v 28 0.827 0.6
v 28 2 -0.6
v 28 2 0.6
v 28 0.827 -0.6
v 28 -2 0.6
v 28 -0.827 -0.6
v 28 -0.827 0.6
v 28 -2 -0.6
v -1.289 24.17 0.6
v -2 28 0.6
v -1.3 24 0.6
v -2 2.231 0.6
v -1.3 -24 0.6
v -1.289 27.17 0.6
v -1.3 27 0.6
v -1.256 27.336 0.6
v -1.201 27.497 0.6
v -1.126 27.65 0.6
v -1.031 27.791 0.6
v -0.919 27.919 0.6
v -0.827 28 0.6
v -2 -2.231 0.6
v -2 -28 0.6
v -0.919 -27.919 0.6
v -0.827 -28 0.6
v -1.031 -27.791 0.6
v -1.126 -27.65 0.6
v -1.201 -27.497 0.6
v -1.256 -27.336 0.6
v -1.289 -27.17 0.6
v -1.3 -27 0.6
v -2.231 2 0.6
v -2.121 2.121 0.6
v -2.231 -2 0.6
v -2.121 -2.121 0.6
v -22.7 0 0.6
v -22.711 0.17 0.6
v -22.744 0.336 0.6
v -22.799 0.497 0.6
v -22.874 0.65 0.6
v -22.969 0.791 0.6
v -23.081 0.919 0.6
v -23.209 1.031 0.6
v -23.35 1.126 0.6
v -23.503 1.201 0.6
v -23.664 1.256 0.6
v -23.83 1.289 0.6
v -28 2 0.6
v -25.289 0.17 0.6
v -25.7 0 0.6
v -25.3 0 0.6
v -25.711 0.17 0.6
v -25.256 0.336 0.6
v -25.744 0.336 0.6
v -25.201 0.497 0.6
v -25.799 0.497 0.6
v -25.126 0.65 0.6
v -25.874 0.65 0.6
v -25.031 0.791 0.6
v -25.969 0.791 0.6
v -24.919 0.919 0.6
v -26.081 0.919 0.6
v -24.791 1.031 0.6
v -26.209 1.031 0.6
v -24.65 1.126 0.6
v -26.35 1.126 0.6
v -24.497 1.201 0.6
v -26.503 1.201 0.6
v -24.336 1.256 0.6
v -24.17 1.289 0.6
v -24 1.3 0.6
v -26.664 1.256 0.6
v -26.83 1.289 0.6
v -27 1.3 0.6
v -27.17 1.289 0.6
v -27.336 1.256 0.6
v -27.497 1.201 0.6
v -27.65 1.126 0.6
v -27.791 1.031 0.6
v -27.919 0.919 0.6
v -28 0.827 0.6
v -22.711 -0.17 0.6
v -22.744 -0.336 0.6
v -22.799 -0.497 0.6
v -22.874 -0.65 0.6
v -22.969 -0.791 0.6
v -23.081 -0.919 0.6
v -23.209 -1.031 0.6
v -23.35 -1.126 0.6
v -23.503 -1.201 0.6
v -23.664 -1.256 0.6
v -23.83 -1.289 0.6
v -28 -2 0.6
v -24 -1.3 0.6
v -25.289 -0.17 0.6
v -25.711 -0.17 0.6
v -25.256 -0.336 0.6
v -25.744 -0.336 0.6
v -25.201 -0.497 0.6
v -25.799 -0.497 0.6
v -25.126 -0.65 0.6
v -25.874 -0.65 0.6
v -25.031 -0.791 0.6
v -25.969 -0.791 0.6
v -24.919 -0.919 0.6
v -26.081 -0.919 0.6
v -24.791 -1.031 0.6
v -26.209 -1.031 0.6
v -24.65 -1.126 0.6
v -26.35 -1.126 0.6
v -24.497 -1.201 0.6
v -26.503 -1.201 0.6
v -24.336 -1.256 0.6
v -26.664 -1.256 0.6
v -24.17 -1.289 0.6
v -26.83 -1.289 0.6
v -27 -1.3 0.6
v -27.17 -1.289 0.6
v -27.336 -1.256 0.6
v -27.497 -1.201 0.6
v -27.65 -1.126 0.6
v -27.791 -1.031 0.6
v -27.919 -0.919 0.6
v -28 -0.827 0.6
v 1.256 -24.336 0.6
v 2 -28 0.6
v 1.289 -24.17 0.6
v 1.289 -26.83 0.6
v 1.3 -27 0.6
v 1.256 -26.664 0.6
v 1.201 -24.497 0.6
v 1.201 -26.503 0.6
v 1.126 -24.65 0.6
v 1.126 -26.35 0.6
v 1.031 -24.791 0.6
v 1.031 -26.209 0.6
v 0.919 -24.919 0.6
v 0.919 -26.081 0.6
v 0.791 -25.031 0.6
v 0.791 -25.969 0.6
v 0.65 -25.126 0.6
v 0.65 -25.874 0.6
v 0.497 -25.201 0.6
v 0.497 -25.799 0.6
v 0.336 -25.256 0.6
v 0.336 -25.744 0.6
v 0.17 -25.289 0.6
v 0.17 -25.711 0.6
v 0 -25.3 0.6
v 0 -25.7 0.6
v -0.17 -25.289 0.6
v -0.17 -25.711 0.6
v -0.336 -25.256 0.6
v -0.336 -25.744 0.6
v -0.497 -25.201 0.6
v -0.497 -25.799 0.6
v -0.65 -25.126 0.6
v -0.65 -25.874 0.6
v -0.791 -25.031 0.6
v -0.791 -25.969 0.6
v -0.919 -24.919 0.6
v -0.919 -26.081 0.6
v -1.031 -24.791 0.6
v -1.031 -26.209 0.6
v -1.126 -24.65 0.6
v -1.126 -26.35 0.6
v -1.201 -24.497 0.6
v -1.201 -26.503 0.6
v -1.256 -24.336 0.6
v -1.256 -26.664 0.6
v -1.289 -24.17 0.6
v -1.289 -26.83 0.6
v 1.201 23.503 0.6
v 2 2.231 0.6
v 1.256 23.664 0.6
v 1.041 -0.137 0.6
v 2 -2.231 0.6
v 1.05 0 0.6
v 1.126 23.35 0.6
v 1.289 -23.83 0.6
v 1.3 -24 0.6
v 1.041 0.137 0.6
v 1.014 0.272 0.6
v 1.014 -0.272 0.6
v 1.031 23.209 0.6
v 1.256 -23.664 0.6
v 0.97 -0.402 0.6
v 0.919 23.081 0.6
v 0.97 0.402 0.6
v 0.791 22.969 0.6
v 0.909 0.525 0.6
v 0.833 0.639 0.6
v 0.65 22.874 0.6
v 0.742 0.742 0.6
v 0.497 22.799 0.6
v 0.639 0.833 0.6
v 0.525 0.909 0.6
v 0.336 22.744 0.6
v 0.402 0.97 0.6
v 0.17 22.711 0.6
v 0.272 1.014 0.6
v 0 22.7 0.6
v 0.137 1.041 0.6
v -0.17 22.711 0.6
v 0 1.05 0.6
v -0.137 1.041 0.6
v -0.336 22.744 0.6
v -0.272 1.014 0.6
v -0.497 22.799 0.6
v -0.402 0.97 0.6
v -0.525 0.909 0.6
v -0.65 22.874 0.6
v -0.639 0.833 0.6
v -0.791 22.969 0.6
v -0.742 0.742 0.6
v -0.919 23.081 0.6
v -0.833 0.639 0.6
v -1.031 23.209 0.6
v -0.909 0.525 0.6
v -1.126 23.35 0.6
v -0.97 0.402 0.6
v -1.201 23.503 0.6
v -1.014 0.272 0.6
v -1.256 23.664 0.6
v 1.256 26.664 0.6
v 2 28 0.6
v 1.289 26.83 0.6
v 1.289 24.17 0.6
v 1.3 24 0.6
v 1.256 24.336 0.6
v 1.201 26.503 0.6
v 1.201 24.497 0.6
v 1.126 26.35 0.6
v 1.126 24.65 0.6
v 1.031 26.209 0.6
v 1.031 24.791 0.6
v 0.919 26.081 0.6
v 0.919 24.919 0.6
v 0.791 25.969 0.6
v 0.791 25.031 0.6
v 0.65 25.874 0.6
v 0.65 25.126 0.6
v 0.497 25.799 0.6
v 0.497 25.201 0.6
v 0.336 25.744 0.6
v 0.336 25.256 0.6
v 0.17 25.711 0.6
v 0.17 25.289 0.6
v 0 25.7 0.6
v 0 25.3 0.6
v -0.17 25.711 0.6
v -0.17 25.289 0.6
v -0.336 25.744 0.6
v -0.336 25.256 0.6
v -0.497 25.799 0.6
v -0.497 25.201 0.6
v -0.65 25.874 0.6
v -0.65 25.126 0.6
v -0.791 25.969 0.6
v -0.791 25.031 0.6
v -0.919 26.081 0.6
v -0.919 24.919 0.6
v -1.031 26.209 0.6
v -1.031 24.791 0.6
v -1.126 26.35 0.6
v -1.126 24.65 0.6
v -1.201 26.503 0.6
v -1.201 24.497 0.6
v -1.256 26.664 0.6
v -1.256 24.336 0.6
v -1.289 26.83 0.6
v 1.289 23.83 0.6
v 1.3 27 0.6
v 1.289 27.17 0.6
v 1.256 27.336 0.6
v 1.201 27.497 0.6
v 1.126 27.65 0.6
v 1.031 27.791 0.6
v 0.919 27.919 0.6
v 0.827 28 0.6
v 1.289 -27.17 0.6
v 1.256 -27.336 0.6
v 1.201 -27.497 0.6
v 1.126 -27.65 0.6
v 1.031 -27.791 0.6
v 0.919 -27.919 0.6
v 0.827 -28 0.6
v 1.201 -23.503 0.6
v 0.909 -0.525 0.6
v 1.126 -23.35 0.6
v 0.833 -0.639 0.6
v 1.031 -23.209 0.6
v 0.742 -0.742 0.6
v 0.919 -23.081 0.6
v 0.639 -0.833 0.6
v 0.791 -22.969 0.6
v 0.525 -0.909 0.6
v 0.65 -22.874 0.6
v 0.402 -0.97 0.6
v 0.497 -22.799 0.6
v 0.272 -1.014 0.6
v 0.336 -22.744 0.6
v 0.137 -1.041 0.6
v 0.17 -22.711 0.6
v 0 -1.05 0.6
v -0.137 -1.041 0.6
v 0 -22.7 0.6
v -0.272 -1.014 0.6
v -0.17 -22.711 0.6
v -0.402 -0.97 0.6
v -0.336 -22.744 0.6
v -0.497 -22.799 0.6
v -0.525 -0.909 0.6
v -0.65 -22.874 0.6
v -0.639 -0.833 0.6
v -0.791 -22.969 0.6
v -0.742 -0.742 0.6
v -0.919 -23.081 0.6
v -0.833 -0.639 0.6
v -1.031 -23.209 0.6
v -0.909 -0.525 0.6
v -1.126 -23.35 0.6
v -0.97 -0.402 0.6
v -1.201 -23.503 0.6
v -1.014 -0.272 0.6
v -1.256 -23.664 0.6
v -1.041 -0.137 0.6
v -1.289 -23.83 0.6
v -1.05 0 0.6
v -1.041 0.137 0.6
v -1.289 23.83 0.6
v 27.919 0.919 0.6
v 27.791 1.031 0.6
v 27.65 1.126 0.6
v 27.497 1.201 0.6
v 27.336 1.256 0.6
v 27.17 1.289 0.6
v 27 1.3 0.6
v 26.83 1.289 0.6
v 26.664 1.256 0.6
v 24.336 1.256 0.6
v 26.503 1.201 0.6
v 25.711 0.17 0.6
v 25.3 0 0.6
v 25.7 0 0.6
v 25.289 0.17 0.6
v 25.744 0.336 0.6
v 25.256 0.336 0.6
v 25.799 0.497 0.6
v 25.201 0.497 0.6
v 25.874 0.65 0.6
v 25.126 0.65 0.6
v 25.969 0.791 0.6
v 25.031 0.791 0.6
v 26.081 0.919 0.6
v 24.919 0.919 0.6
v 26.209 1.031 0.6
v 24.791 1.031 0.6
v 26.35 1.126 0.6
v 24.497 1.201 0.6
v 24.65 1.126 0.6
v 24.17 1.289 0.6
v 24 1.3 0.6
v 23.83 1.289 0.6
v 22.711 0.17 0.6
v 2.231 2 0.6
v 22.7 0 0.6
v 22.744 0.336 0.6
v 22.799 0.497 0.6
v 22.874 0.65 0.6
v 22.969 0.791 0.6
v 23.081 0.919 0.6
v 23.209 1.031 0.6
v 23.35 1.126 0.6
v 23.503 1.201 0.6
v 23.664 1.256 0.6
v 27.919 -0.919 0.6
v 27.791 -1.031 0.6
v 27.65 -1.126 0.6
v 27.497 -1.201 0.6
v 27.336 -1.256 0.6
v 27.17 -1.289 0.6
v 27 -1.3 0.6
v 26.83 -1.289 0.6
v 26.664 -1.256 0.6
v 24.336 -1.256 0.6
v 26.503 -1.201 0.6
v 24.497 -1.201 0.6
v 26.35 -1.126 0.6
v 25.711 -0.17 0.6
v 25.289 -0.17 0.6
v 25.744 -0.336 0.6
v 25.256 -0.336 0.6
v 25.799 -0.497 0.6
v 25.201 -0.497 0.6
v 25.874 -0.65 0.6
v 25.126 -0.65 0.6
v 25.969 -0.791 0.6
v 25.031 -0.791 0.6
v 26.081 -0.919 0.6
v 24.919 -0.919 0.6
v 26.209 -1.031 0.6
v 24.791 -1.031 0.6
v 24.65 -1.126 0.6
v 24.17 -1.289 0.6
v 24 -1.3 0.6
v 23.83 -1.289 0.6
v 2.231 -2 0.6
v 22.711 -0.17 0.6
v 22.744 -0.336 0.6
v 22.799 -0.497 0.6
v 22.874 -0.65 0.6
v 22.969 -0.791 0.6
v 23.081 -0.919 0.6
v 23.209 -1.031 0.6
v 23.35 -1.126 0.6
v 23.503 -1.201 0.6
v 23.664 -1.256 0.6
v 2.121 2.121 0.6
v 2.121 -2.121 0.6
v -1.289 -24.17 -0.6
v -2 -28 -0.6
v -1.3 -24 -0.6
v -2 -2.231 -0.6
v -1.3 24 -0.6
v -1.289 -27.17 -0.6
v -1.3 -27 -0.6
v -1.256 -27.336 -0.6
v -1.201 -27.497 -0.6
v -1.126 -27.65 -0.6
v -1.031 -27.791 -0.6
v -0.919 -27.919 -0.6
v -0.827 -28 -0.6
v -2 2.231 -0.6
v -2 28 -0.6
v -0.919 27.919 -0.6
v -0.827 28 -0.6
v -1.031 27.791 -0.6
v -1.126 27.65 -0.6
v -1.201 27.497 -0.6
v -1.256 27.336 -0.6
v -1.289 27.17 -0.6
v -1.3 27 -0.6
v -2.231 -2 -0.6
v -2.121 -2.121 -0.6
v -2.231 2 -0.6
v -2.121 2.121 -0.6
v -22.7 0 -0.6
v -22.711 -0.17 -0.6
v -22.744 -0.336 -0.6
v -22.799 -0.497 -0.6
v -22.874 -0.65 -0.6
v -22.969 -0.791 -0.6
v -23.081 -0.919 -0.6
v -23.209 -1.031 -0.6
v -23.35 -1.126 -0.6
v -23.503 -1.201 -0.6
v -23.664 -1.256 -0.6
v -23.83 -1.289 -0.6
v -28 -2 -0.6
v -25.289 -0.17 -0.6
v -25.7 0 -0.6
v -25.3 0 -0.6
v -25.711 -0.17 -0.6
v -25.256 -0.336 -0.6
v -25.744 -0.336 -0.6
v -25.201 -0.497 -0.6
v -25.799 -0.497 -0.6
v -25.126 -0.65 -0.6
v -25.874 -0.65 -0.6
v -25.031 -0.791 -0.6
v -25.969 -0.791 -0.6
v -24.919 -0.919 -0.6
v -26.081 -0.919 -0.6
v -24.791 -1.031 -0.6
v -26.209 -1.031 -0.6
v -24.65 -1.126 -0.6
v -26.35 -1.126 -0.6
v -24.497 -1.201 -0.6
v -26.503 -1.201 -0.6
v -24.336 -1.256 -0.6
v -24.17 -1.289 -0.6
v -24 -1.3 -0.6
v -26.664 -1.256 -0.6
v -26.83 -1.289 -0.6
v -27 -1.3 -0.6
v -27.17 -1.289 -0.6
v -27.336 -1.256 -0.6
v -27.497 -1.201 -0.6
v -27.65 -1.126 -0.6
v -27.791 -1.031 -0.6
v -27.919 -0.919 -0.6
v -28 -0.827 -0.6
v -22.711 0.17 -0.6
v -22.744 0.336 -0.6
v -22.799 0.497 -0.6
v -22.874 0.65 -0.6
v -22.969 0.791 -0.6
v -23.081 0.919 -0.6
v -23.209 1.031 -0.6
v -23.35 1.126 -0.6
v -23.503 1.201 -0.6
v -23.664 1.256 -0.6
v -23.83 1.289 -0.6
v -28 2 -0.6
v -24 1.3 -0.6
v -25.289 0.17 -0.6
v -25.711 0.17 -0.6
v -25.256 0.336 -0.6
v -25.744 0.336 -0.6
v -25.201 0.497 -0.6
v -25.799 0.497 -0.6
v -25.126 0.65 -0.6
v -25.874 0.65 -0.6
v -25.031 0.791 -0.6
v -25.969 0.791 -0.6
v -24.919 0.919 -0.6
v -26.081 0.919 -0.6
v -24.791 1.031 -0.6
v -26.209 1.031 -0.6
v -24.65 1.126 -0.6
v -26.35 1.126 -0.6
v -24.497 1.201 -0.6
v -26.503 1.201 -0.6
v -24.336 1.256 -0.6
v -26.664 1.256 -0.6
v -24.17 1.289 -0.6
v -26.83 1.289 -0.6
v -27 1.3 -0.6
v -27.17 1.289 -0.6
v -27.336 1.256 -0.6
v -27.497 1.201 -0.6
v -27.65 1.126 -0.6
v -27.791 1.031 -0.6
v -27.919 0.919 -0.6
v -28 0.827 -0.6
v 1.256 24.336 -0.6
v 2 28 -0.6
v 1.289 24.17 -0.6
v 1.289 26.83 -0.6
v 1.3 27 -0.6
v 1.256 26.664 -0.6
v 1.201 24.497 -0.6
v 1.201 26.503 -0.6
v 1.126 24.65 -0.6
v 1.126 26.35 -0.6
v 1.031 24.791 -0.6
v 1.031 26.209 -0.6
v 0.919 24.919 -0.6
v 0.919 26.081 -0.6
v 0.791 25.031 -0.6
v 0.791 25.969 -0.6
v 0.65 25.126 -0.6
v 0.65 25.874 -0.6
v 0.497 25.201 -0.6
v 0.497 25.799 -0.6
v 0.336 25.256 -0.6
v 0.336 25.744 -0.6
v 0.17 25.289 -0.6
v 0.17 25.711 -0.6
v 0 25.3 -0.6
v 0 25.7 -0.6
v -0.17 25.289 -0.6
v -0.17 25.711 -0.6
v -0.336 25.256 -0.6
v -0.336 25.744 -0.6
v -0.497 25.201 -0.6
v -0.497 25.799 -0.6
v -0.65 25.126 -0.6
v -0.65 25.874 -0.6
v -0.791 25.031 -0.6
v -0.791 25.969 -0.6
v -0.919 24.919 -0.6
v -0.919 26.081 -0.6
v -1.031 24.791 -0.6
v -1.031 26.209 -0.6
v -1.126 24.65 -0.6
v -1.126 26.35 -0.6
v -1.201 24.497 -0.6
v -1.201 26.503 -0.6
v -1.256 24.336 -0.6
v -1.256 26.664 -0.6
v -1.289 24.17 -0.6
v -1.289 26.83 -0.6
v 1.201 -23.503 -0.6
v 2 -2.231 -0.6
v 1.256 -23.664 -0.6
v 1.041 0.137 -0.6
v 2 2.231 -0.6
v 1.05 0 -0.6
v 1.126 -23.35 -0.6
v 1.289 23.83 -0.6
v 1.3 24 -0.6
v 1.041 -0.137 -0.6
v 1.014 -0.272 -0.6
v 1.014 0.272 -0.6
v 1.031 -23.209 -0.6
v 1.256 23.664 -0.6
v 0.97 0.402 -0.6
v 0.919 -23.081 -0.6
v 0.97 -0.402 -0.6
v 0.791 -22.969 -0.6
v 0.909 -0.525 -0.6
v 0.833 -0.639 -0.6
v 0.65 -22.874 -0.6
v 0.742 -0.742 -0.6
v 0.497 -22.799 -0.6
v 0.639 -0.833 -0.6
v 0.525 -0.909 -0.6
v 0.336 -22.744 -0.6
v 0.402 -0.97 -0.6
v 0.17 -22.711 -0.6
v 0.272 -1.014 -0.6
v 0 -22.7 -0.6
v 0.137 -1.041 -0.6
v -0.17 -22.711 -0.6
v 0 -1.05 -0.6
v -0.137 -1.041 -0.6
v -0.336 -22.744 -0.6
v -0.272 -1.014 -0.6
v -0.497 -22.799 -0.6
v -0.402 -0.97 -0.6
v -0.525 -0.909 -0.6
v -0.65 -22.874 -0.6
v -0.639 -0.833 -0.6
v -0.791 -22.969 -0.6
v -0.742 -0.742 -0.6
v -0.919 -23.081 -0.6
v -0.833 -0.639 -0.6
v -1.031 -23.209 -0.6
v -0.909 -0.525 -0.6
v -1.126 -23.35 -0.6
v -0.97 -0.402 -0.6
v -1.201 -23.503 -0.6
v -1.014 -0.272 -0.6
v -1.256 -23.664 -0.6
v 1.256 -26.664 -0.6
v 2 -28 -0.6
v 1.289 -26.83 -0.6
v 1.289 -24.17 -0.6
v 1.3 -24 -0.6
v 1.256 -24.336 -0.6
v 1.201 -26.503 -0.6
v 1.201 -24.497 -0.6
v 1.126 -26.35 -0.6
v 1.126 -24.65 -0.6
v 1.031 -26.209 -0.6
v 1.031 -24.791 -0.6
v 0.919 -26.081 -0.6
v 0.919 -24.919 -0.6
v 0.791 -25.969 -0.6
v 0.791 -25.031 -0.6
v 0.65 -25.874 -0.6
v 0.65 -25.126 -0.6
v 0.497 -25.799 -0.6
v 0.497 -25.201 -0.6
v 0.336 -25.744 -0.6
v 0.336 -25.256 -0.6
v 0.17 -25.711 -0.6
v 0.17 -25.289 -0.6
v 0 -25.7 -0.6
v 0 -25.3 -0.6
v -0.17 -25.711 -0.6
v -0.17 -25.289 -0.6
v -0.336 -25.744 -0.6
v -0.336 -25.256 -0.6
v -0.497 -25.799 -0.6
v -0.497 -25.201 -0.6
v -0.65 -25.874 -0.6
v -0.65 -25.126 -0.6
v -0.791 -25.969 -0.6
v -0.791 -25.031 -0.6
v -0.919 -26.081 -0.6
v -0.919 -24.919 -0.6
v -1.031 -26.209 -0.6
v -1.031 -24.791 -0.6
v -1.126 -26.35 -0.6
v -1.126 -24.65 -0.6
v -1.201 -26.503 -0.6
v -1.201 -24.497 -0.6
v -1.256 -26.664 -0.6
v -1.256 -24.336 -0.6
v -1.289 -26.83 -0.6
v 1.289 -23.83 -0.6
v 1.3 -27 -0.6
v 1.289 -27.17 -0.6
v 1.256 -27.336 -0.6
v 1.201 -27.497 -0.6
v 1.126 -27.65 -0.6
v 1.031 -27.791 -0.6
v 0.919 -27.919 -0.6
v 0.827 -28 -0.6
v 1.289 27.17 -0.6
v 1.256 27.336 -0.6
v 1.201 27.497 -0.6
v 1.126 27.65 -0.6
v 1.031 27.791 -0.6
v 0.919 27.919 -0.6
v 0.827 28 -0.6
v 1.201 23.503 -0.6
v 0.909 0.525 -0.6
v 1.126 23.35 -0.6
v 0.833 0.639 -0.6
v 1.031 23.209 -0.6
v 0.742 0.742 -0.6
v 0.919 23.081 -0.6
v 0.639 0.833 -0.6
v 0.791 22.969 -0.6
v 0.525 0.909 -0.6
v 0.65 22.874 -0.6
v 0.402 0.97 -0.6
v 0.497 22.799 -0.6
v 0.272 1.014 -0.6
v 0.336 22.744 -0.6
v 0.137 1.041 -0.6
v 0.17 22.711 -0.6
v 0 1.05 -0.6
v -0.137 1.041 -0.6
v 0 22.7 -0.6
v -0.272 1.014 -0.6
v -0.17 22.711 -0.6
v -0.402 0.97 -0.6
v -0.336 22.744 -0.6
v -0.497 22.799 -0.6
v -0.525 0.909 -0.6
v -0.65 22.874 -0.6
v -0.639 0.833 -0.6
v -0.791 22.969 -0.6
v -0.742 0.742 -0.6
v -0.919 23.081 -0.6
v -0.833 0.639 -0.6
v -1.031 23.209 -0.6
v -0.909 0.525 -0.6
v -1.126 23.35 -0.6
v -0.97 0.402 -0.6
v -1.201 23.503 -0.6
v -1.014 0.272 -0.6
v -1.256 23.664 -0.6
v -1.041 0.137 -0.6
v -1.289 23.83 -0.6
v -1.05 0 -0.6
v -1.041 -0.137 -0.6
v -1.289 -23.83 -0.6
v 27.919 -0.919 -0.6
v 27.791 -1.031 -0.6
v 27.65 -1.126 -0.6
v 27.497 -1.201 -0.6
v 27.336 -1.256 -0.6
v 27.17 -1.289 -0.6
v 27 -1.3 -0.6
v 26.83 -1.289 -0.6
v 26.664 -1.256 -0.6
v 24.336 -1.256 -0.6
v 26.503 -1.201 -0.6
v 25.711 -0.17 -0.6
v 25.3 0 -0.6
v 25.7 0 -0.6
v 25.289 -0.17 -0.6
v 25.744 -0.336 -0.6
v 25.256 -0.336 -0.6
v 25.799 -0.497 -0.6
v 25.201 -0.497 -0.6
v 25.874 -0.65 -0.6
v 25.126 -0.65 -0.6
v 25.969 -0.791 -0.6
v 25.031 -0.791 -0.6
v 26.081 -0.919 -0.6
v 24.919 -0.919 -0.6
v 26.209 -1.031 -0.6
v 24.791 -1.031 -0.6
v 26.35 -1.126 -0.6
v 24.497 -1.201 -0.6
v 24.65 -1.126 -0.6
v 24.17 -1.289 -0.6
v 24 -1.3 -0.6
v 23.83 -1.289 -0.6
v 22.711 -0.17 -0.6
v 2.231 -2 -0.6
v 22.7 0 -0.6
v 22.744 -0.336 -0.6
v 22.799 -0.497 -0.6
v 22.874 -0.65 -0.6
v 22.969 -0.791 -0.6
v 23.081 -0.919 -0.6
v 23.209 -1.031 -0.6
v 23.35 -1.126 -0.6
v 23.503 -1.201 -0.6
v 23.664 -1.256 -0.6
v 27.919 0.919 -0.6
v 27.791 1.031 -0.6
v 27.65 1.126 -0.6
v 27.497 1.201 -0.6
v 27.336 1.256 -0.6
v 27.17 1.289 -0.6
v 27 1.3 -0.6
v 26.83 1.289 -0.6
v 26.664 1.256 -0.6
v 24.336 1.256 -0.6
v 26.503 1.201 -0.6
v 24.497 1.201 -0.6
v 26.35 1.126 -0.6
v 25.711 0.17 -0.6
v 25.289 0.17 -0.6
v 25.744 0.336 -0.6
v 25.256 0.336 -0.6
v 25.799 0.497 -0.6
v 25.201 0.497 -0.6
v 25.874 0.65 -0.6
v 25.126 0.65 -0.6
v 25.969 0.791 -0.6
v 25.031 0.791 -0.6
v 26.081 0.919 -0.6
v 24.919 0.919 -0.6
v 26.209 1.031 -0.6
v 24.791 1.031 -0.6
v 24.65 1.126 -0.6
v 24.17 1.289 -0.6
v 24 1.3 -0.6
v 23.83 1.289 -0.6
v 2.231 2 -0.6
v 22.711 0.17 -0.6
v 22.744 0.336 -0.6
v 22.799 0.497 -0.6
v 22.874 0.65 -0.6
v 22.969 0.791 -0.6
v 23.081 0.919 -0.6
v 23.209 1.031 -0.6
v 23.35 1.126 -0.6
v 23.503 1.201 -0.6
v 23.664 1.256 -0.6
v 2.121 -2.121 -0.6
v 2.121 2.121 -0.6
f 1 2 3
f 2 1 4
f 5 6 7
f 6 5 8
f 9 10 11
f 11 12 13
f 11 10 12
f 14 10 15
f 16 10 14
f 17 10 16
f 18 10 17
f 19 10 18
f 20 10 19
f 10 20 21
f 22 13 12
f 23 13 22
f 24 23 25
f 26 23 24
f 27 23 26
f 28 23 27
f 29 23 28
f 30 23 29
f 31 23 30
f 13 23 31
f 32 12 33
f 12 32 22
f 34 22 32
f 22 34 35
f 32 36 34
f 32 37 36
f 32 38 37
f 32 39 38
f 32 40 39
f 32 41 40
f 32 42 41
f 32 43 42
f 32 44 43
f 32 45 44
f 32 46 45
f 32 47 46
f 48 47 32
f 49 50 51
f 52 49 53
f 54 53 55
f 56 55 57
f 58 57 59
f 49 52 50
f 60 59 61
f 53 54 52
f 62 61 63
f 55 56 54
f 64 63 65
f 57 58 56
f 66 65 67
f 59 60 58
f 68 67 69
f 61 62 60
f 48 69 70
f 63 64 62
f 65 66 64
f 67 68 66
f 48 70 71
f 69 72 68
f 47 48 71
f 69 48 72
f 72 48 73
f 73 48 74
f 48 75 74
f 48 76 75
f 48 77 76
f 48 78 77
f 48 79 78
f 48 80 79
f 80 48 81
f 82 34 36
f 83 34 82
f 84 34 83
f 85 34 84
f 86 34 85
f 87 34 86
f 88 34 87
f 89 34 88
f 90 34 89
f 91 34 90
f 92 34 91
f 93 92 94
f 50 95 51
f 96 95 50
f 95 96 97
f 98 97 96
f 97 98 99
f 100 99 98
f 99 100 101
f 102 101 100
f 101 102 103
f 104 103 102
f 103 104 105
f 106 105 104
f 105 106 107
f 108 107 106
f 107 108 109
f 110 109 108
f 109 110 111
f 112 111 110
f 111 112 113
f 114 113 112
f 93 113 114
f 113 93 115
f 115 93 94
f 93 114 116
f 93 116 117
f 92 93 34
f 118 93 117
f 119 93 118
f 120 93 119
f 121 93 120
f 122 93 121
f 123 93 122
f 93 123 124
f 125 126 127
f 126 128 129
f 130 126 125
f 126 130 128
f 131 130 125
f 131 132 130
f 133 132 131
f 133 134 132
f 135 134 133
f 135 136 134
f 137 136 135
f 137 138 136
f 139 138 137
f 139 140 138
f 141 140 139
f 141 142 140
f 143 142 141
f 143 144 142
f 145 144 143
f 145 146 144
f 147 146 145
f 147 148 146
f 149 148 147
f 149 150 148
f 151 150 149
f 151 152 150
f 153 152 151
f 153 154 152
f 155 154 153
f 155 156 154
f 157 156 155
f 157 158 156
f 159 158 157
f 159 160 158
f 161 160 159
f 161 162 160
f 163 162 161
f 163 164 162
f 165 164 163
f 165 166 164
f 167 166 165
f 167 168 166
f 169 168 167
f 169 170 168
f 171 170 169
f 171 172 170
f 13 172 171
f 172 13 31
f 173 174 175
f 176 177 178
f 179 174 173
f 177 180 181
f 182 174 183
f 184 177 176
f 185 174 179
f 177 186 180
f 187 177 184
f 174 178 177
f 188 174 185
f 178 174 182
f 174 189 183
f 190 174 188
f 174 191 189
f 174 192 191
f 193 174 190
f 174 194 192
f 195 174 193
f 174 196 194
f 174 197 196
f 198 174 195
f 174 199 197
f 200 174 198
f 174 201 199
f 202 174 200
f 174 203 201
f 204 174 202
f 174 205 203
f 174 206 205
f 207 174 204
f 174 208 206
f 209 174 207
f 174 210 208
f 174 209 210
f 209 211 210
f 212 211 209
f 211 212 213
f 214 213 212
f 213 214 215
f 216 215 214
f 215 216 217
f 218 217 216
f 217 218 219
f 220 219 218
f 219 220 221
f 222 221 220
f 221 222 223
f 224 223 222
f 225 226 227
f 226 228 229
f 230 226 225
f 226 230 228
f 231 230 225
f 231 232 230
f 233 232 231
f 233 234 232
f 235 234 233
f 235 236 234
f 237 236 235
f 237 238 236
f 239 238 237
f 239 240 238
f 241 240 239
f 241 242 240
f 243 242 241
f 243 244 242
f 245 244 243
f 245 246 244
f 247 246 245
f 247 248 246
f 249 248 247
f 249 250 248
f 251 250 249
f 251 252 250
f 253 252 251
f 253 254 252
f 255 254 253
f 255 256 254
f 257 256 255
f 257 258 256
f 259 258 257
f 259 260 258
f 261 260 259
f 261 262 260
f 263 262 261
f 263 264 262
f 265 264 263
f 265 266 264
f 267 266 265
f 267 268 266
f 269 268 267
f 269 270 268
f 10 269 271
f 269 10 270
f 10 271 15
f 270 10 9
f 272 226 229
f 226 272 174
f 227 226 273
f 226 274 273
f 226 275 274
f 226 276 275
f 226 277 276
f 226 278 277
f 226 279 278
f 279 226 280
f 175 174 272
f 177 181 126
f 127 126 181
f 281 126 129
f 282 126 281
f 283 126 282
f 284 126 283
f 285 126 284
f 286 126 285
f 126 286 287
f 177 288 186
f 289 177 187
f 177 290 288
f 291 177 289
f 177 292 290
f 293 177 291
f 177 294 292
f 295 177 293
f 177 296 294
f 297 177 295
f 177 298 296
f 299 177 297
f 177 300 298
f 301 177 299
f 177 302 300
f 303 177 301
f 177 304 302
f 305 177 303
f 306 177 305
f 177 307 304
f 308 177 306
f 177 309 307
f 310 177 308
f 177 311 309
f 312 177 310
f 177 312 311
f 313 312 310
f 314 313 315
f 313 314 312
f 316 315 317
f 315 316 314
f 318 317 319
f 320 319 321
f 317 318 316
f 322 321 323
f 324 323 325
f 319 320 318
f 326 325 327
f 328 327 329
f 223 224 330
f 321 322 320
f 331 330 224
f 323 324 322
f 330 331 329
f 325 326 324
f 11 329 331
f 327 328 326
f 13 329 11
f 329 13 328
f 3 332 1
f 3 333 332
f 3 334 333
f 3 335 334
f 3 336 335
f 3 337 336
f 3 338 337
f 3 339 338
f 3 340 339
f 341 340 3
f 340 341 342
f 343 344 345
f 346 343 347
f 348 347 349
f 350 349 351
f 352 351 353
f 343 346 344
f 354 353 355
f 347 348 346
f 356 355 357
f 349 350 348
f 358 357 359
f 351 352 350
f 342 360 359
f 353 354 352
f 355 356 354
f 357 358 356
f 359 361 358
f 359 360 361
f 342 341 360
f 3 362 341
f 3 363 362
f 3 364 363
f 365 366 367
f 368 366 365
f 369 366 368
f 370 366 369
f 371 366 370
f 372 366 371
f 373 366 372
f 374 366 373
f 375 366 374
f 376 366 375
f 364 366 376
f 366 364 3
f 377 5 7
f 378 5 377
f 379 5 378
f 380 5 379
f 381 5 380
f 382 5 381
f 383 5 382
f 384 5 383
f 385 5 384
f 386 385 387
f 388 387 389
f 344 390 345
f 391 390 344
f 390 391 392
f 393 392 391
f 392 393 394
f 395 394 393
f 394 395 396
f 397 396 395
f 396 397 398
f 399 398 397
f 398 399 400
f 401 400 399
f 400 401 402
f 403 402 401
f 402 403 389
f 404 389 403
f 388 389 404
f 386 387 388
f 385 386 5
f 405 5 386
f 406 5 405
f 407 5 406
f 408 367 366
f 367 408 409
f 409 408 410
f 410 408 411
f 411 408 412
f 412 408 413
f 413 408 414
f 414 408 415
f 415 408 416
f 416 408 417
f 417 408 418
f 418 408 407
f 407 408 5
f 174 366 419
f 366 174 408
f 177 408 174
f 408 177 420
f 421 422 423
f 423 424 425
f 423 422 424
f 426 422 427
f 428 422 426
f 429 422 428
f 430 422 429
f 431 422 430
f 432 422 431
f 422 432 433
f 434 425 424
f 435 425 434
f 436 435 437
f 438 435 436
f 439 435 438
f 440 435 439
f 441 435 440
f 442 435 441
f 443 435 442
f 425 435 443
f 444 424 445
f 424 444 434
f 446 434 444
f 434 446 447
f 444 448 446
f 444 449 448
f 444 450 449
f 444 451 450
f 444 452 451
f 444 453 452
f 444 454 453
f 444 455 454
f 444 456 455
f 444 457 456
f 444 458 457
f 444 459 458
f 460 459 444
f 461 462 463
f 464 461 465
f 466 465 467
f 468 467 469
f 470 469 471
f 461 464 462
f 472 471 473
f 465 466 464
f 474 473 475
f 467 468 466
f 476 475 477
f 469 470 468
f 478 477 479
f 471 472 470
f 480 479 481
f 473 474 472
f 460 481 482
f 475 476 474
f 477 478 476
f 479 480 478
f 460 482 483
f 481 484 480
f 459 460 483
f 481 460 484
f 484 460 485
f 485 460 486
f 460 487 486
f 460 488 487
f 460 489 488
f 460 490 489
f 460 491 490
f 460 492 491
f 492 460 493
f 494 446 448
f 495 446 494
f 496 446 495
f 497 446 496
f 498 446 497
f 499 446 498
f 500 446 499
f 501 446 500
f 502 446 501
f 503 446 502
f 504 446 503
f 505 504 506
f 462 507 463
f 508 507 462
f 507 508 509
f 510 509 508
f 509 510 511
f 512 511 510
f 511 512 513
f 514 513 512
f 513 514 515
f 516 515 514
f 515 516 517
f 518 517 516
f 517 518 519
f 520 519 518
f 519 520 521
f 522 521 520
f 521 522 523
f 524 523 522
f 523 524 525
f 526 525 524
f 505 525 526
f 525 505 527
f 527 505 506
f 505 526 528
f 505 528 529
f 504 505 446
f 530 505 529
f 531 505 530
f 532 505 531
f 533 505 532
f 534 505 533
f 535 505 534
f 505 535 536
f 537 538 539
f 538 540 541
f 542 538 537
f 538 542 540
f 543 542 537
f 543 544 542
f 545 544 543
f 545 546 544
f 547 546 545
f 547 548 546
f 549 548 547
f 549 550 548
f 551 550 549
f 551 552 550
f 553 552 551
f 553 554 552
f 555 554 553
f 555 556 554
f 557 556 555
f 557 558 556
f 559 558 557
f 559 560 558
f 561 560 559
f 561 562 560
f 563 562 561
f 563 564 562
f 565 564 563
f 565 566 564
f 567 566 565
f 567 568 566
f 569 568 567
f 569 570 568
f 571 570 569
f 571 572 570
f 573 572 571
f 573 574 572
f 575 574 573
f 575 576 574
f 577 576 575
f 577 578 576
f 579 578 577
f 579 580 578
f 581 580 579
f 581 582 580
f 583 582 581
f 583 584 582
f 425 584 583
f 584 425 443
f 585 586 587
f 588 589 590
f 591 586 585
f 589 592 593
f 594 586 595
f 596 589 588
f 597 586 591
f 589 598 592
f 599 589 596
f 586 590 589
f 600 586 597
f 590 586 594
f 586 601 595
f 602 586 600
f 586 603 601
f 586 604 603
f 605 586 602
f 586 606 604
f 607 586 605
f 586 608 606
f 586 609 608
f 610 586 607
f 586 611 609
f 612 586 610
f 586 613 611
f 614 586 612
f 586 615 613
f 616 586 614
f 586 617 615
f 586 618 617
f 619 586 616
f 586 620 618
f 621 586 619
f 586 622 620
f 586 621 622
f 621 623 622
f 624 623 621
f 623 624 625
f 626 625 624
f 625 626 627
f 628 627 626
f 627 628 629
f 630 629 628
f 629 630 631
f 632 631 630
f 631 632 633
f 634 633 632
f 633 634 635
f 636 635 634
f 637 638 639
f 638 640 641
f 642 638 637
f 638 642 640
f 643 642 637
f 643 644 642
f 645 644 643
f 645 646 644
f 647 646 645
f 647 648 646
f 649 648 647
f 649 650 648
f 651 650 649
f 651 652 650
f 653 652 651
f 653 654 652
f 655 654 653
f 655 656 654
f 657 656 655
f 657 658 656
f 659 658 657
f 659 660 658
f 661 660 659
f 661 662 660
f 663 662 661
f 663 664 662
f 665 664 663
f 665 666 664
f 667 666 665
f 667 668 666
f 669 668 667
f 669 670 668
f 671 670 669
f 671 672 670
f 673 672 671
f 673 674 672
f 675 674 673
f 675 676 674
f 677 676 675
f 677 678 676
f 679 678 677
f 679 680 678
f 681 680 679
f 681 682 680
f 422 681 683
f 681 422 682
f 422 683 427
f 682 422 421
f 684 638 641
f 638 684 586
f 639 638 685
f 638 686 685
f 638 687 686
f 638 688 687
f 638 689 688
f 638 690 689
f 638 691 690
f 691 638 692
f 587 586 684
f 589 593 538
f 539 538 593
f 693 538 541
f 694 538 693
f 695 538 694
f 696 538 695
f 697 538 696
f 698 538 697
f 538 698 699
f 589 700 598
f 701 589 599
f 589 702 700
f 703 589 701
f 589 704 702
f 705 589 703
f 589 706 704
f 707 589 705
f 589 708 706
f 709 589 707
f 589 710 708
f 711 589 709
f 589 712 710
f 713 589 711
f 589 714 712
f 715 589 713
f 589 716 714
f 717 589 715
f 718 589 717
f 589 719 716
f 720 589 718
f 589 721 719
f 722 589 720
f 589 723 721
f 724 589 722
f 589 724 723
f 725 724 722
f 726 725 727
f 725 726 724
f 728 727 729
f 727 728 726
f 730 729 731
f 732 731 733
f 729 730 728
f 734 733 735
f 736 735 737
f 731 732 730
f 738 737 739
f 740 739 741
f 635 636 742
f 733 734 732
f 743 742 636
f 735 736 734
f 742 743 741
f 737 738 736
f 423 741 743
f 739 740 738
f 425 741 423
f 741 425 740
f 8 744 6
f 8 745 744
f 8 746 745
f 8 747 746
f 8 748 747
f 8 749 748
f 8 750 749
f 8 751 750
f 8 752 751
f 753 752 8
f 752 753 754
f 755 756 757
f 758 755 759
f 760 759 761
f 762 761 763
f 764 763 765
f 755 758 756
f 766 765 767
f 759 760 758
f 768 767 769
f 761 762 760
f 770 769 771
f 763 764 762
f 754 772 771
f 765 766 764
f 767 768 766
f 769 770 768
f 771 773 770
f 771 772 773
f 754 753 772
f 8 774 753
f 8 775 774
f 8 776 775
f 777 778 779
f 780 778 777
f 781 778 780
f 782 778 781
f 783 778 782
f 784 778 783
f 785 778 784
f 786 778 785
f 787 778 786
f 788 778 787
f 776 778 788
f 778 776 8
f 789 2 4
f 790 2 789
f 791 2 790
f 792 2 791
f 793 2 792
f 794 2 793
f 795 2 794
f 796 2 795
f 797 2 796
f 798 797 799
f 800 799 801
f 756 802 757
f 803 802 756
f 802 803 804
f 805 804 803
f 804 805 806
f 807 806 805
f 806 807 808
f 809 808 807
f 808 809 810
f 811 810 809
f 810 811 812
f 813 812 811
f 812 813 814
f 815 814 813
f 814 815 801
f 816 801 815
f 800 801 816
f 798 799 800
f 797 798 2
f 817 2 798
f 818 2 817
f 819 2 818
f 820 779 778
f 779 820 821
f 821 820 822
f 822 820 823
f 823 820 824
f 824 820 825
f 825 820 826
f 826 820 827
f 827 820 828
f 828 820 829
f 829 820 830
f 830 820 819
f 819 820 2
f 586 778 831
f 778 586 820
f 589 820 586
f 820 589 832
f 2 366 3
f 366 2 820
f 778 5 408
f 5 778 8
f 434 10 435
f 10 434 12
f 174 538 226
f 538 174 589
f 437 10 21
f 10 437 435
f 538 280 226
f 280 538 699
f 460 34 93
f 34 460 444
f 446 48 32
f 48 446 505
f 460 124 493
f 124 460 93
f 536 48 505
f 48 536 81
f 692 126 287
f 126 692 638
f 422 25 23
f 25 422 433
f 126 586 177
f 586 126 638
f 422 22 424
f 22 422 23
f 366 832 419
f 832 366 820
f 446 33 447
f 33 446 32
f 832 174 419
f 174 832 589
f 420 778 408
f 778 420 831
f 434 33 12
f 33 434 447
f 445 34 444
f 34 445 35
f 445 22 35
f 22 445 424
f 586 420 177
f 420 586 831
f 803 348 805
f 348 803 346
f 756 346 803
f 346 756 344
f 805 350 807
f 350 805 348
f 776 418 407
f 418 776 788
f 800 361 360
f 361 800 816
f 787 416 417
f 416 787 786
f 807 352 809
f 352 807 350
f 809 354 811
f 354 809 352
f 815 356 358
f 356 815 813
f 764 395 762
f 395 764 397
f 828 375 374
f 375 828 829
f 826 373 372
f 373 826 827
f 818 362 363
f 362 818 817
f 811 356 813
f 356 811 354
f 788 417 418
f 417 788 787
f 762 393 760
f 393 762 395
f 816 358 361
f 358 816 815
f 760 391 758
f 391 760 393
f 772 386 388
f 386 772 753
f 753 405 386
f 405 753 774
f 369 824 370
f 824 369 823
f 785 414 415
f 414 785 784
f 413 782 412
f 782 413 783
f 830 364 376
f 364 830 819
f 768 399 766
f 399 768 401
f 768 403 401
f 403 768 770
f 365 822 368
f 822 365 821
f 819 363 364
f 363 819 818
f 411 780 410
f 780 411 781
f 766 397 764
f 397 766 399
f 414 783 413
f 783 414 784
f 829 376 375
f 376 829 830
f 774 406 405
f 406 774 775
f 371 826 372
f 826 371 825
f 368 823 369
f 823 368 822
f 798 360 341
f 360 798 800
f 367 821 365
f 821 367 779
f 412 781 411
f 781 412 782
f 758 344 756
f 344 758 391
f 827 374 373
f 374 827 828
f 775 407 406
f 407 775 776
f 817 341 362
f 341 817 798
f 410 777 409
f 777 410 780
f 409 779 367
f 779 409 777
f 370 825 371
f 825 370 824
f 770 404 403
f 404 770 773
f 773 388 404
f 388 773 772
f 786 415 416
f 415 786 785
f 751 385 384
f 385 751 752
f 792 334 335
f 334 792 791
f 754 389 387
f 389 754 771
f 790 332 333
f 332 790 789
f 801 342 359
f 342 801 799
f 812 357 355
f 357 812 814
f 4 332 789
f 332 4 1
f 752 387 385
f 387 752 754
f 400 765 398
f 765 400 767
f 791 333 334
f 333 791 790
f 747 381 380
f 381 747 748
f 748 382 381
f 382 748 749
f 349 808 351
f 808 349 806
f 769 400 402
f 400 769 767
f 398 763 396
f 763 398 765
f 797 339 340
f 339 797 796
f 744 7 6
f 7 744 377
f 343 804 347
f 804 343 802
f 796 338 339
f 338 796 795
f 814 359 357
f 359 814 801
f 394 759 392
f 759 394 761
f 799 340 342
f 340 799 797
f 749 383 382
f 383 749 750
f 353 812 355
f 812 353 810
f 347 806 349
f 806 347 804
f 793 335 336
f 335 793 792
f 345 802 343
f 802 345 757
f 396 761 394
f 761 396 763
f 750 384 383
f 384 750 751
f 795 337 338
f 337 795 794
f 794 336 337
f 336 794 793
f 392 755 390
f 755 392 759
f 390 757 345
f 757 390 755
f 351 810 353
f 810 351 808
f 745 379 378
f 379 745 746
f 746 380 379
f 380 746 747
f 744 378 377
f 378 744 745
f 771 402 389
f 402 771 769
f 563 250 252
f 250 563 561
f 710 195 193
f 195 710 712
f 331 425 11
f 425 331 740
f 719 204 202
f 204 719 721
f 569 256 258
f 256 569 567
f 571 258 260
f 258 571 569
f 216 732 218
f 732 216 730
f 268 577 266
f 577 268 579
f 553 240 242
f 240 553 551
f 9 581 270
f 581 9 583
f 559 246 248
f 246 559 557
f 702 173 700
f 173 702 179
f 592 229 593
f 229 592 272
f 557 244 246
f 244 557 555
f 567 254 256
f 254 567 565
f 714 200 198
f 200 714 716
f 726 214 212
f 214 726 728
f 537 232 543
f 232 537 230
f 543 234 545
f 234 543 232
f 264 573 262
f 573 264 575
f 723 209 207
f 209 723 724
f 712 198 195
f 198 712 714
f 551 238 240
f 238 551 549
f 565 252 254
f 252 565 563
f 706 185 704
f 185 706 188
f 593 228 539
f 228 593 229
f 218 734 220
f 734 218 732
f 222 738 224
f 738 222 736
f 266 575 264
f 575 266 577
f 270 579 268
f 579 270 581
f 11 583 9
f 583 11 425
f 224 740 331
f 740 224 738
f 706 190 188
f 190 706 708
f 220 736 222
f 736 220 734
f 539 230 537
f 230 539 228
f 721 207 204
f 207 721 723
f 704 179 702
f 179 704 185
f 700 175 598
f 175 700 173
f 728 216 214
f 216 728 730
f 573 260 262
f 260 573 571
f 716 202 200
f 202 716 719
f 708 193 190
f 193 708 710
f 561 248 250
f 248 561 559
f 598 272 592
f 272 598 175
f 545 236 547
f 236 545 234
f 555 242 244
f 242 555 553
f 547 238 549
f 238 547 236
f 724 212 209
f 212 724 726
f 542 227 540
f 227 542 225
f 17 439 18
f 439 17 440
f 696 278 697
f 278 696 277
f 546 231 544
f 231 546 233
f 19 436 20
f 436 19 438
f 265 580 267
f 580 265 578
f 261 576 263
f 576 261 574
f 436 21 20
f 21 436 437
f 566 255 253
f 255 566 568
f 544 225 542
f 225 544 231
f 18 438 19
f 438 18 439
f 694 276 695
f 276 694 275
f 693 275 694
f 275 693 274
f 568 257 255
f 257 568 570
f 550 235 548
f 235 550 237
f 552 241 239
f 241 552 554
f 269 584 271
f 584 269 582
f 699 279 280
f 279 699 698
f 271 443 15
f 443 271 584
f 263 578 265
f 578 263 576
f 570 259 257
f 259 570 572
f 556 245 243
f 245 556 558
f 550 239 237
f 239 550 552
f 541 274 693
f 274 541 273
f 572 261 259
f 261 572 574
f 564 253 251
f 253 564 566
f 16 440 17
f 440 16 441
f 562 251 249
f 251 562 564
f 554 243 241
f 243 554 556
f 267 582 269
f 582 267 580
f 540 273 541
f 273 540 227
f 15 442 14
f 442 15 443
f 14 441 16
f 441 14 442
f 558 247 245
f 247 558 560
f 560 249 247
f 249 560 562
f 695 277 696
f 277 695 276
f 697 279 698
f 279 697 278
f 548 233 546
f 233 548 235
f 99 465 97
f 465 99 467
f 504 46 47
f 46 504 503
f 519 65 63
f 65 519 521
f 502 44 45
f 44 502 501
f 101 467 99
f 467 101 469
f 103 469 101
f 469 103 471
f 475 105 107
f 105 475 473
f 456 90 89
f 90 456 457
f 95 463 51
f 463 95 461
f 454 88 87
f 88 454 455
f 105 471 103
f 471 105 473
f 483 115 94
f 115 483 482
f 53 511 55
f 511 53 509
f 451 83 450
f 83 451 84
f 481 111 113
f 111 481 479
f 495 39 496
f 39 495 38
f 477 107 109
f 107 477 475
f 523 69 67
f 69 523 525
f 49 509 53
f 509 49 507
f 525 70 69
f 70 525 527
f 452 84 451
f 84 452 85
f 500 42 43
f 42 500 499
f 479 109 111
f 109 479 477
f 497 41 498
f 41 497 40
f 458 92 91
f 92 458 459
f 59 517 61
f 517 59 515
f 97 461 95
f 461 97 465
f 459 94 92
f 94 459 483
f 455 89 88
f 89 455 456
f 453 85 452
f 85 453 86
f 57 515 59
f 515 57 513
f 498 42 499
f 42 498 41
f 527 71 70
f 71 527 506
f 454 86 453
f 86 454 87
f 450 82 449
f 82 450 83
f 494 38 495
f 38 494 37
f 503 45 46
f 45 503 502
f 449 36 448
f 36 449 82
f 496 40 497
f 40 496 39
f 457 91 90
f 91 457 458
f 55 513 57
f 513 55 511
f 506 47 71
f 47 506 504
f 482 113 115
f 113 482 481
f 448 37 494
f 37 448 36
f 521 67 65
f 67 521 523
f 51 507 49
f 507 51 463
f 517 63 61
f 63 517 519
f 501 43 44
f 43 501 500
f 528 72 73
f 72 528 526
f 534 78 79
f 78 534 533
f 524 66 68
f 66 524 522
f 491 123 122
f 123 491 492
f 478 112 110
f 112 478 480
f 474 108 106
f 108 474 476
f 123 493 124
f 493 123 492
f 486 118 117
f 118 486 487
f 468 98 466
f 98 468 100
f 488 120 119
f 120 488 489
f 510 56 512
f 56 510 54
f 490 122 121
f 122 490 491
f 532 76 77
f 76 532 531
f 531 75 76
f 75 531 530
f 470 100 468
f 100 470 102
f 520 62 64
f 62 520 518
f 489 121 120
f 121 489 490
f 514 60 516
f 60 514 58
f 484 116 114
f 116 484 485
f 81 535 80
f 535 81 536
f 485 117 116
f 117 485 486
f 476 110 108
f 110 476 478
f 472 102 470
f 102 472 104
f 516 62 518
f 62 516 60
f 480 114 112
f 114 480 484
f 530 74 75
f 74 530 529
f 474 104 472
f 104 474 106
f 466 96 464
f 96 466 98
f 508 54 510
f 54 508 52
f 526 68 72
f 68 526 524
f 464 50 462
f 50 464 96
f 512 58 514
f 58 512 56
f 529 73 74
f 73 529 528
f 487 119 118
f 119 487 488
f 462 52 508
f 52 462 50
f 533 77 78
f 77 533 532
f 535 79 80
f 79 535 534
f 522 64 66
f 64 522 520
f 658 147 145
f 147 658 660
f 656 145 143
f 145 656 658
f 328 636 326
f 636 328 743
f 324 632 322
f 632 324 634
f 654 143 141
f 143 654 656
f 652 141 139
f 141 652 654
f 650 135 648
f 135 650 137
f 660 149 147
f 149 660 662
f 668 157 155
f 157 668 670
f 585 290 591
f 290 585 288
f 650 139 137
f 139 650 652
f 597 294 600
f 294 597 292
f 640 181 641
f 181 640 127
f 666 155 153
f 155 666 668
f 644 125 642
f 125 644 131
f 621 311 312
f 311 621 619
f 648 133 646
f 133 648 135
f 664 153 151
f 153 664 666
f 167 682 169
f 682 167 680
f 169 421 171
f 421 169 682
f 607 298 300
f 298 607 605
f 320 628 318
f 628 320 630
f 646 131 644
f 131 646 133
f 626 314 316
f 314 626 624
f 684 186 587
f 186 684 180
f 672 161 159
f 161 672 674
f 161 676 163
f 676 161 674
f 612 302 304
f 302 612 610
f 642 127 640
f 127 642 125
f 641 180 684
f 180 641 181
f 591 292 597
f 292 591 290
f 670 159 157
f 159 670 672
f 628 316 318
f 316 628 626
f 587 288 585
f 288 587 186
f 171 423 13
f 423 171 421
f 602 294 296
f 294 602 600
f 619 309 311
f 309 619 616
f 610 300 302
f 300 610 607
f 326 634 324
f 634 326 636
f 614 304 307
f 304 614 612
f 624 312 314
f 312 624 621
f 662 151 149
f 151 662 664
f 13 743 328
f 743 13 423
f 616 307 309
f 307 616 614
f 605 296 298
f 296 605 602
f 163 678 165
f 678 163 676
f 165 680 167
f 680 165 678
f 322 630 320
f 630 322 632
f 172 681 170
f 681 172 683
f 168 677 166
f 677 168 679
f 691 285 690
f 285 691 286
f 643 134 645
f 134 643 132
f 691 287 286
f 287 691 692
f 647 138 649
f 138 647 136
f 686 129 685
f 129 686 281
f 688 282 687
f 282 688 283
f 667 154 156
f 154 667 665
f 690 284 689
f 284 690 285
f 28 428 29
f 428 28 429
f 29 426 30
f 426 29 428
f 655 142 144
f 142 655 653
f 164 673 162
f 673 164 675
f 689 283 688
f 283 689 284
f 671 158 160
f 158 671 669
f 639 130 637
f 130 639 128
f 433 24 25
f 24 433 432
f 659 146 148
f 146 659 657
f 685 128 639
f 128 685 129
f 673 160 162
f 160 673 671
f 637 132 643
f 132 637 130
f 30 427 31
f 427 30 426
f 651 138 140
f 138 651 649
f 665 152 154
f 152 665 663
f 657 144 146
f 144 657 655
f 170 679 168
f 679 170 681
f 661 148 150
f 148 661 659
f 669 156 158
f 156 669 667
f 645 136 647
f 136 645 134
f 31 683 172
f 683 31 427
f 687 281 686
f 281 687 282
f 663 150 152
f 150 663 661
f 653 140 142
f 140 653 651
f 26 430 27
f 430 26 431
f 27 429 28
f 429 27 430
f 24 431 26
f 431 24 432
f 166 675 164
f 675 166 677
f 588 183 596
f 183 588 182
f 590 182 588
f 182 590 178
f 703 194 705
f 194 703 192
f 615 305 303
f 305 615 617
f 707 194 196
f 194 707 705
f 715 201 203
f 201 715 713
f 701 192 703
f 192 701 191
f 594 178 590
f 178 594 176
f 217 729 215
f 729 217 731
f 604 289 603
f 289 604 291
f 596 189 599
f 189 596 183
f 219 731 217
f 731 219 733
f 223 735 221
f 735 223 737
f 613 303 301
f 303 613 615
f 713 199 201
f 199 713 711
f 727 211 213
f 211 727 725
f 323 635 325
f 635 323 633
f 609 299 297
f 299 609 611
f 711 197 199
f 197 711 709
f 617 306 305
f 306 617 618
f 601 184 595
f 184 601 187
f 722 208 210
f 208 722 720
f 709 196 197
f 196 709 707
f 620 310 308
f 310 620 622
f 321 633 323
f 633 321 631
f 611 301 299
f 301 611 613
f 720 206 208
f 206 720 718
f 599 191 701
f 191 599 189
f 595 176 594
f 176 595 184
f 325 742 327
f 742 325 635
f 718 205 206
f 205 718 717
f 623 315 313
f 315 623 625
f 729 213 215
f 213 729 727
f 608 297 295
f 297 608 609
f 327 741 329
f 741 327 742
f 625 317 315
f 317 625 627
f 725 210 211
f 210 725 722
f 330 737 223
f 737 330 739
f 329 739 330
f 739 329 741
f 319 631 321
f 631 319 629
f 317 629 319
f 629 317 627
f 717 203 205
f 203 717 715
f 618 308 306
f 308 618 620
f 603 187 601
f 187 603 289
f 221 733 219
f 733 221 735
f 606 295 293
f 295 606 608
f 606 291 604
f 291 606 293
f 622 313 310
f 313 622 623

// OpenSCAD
// Experimental M5/M6 internal rope-guide spider.
// Not a released/print-approved part: guide-to-body clearance and friction remain
// to be checked against deformed module geometry and a physical sample.
//
// Export one guide: set guide_kind to "M5" or "M6", press F6, then export STL.
// M5 routes B/C (r=24/27 mm); M6 routes C (r=27 mm).
// The guide is a thin cross spider supported on the central Ø1.8 mm backbone.

guide_kind = "M5"; // [M5,M6]
rope_hole_d = 2.6;         // 2.0 mm rope with 0.3 mm radial running clearance
backbone_hole_d = 2.1;     // 1.8 mm NiTi backbone
plate_thickness = 1.2;
arm_width = 4.0;
hub_diameter = 6.0;
arm_tip_radius = 29.5;
show_rope_preview = false;
guide_pitch = 24;
show_three_guides = false;

module one_guide(kind="M5") {
    radii = kind == "M5" ? [24, 27] : [27];
    difference() {
        union() {
            cylinder(d=hub_diameter, h=plate_thickness, center=true, $fn=64);
            for (a = [0:90:270])
                rotate([0,0,a])
                    translate([arm_tip_radius/2,0,0])
                        cube([arm_tip_radius-hub_diameter/2,arm_width,plate_thickness], center=true);
        }
        cylinder(d=backbone_hole_d, h=plate_thickness+1, center=true, $fn=48);
        for (a = [0:90:270])
            for (r = radii)
                rotate([0,0,a])
                    translate([r,0,0])
                        cylinder(d=rope_hole_d, h=plate_thickness+1, center=true, $fn=48);
    }
}

if (show_three_guides) {
    for (z = [-guide_pitch, 0, guide_pitch])
        translate([0,0,z]) one_guide(guide_kind);
} else if (show_rope_preview) {
    color([0.45,0.48,0.52]) one_guide(guide_kind);
    for (a = [0:90:270])
        for (r = (guide_kind == "M5" ? [24,27] : [27]))
            rotate([0,0,a])
                translate([r,0,0])
                    color([0.88,0.55,0.08])
                        cylinder(d=2,h=guide_pitch*2,center=true,$fn=32);
} else {
    one_guide(guide_kind);
}
